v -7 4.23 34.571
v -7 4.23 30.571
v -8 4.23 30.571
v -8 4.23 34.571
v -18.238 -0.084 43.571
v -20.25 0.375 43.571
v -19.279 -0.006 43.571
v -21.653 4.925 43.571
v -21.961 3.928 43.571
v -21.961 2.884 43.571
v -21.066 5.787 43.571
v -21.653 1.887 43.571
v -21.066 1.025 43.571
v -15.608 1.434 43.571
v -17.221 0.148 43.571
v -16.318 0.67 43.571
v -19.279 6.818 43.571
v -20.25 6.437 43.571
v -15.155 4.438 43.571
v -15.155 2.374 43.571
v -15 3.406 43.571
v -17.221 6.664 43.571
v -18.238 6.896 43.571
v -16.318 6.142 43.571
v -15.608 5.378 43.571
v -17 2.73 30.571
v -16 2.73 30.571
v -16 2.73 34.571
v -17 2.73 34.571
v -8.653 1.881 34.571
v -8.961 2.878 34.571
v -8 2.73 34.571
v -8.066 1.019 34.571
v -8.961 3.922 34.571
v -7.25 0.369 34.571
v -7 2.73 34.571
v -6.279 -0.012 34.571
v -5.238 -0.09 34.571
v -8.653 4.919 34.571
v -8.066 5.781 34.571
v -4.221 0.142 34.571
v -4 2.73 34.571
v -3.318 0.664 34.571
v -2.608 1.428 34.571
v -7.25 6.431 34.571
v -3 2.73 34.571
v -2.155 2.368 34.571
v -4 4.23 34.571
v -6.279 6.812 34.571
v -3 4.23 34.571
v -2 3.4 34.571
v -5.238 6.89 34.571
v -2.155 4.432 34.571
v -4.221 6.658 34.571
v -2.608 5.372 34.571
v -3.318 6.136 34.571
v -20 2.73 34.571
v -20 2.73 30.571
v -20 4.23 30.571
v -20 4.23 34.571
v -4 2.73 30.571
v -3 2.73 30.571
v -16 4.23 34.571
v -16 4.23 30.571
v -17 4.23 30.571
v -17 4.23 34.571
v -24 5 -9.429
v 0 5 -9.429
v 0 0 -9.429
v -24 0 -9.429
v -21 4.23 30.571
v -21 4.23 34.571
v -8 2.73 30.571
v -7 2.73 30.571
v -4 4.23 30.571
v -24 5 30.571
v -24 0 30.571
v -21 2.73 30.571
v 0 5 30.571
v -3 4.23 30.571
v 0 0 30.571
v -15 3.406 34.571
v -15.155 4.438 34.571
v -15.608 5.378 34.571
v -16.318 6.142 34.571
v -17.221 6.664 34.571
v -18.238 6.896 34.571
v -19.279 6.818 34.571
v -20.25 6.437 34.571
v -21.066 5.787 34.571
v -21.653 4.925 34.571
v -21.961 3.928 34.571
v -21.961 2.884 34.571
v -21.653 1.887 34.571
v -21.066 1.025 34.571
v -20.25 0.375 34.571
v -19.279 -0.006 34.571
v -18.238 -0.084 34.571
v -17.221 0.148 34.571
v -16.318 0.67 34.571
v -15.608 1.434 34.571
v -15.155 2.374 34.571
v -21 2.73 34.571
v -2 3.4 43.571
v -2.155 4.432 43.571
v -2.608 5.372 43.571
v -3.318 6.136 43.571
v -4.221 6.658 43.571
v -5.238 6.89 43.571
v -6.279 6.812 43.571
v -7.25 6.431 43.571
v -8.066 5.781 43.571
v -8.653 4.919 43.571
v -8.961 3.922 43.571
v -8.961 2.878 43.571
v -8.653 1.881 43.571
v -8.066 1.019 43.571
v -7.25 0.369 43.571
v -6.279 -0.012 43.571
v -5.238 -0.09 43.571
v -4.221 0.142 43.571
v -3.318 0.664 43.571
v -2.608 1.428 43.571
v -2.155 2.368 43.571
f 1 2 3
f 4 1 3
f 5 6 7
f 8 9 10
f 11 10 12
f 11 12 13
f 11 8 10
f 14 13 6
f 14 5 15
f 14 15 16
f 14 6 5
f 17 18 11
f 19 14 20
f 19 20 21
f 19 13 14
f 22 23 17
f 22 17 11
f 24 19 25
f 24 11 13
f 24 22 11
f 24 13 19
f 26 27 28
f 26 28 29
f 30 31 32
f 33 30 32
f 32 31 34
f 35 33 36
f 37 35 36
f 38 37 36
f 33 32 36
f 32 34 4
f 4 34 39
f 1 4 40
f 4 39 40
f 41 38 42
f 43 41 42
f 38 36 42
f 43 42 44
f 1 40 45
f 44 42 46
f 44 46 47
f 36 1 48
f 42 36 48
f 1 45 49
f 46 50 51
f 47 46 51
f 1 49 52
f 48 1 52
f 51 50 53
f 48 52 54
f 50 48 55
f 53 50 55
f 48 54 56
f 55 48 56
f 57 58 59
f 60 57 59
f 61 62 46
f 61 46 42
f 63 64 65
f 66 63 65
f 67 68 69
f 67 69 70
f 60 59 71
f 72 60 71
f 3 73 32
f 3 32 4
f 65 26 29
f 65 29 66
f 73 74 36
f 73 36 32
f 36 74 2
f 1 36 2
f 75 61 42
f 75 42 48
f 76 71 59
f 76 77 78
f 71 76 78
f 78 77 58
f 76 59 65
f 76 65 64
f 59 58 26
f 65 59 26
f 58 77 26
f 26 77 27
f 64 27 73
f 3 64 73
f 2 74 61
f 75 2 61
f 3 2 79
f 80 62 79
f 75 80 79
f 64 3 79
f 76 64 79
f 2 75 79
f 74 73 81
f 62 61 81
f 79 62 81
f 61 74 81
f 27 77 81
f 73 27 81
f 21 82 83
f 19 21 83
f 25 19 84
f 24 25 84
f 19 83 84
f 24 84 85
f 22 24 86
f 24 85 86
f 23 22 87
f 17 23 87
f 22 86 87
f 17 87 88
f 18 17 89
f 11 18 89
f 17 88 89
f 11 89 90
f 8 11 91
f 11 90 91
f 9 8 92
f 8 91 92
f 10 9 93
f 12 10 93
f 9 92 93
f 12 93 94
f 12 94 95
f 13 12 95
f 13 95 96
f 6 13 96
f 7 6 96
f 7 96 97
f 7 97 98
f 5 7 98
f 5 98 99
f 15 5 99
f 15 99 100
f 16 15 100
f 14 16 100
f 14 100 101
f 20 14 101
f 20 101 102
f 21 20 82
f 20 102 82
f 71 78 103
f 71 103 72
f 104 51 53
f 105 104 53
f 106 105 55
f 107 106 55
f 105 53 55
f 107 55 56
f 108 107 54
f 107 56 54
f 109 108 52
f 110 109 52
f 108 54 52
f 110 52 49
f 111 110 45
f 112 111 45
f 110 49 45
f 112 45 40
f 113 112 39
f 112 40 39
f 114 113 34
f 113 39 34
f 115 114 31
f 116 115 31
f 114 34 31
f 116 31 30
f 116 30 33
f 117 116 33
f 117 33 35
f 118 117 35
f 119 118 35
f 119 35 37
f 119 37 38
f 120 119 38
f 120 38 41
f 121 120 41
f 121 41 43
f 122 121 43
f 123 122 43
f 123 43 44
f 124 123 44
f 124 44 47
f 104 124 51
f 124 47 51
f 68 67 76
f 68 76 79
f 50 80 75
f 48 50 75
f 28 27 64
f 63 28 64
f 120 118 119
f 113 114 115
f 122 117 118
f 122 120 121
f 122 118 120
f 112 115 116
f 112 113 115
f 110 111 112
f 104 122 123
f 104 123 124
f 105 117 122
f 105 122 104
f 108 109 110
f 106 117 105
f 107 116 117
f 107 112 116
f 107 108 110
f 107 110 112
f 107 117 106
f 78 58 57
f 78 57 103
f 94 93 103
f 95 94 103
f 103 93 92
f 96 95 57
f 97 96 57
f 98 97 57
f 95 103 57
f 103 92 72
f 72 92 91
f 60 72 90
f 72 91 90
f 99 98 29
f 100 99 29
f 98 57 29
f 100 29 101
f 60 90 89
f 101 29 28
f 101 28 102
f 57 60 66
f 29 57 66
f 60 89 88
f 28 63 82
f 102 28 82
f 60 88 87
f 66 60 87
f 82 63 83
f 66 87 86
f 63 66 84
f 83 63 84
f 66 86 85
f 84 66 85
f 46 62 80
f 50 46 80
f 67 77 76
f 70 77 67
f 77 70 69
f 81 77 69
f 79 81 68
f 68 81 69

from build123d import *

# Parameters (mm, degrees)
SKETCH1_W           = 24
SKETCH1_H           = 40
BOSS_EXTRUDE1_DEPTH = 5
SKETCH2_W           = 1
SKETCH2_H           = 1.5
BOSS_EXTRUDE5_DEPTH = 44
SKETCH6_R           = 3.5
BOSS_EXTRUDE9_DEPTH = 9


with BuildPart() as part:
    # Sketch1 → Boss-Extrude1 (new body)
    with BuildSketch(Plane(origin=(0, 0, 0), x_dir=(1, 0, 0), z_dir=(0, 1, 0))):
        with Locations((-12, -10.571428571)):
            Rectangle(SKETCH1_W, SKETCH1_H)
    extrude(amount=BOSS_EXTRUDE1_DEPTH)

    # Sketch2 → Boss-Extrude5 (add)
    with BuildSketch(Plane(origin=(0, 0, -9.428571429), x_dir=(-1, 0, 0), z_dir=(0, 0, -1))):
        with Locations((3.5, 3.479518838)):
            Rectangle(SKETCH2_W, SKETCH2_H)
        with Locations((7.5, 3.479518838)):
            Rectangle(SKETCH2_W, SKETCH2_H)
        with Locations((16.5, 3.479518838)):
            Rectangle(SKETCH2_W, SKETCH2_H)
        with Locations((20.5, 3.479518838)):
            Rectangle(SKETCH2_W, SKETCH2_H)
    extrude(amount=-BOSS_EXTRUDE5_DEPTH)

    # Sketch6 → Boss-Extrude9 (add)
    with BuildSketch(Plane.XY.offset(34.571428571)):
        with Locations((-18.5, 3.40608753)):
            Circle(SKETCH6_R)
        with Locations((-5.5, 3.4)):
            Circle(SKETCH6_R)
    extrude(amount=BOSS_EXTRUDE9_DEPTH)


solid = part.part
